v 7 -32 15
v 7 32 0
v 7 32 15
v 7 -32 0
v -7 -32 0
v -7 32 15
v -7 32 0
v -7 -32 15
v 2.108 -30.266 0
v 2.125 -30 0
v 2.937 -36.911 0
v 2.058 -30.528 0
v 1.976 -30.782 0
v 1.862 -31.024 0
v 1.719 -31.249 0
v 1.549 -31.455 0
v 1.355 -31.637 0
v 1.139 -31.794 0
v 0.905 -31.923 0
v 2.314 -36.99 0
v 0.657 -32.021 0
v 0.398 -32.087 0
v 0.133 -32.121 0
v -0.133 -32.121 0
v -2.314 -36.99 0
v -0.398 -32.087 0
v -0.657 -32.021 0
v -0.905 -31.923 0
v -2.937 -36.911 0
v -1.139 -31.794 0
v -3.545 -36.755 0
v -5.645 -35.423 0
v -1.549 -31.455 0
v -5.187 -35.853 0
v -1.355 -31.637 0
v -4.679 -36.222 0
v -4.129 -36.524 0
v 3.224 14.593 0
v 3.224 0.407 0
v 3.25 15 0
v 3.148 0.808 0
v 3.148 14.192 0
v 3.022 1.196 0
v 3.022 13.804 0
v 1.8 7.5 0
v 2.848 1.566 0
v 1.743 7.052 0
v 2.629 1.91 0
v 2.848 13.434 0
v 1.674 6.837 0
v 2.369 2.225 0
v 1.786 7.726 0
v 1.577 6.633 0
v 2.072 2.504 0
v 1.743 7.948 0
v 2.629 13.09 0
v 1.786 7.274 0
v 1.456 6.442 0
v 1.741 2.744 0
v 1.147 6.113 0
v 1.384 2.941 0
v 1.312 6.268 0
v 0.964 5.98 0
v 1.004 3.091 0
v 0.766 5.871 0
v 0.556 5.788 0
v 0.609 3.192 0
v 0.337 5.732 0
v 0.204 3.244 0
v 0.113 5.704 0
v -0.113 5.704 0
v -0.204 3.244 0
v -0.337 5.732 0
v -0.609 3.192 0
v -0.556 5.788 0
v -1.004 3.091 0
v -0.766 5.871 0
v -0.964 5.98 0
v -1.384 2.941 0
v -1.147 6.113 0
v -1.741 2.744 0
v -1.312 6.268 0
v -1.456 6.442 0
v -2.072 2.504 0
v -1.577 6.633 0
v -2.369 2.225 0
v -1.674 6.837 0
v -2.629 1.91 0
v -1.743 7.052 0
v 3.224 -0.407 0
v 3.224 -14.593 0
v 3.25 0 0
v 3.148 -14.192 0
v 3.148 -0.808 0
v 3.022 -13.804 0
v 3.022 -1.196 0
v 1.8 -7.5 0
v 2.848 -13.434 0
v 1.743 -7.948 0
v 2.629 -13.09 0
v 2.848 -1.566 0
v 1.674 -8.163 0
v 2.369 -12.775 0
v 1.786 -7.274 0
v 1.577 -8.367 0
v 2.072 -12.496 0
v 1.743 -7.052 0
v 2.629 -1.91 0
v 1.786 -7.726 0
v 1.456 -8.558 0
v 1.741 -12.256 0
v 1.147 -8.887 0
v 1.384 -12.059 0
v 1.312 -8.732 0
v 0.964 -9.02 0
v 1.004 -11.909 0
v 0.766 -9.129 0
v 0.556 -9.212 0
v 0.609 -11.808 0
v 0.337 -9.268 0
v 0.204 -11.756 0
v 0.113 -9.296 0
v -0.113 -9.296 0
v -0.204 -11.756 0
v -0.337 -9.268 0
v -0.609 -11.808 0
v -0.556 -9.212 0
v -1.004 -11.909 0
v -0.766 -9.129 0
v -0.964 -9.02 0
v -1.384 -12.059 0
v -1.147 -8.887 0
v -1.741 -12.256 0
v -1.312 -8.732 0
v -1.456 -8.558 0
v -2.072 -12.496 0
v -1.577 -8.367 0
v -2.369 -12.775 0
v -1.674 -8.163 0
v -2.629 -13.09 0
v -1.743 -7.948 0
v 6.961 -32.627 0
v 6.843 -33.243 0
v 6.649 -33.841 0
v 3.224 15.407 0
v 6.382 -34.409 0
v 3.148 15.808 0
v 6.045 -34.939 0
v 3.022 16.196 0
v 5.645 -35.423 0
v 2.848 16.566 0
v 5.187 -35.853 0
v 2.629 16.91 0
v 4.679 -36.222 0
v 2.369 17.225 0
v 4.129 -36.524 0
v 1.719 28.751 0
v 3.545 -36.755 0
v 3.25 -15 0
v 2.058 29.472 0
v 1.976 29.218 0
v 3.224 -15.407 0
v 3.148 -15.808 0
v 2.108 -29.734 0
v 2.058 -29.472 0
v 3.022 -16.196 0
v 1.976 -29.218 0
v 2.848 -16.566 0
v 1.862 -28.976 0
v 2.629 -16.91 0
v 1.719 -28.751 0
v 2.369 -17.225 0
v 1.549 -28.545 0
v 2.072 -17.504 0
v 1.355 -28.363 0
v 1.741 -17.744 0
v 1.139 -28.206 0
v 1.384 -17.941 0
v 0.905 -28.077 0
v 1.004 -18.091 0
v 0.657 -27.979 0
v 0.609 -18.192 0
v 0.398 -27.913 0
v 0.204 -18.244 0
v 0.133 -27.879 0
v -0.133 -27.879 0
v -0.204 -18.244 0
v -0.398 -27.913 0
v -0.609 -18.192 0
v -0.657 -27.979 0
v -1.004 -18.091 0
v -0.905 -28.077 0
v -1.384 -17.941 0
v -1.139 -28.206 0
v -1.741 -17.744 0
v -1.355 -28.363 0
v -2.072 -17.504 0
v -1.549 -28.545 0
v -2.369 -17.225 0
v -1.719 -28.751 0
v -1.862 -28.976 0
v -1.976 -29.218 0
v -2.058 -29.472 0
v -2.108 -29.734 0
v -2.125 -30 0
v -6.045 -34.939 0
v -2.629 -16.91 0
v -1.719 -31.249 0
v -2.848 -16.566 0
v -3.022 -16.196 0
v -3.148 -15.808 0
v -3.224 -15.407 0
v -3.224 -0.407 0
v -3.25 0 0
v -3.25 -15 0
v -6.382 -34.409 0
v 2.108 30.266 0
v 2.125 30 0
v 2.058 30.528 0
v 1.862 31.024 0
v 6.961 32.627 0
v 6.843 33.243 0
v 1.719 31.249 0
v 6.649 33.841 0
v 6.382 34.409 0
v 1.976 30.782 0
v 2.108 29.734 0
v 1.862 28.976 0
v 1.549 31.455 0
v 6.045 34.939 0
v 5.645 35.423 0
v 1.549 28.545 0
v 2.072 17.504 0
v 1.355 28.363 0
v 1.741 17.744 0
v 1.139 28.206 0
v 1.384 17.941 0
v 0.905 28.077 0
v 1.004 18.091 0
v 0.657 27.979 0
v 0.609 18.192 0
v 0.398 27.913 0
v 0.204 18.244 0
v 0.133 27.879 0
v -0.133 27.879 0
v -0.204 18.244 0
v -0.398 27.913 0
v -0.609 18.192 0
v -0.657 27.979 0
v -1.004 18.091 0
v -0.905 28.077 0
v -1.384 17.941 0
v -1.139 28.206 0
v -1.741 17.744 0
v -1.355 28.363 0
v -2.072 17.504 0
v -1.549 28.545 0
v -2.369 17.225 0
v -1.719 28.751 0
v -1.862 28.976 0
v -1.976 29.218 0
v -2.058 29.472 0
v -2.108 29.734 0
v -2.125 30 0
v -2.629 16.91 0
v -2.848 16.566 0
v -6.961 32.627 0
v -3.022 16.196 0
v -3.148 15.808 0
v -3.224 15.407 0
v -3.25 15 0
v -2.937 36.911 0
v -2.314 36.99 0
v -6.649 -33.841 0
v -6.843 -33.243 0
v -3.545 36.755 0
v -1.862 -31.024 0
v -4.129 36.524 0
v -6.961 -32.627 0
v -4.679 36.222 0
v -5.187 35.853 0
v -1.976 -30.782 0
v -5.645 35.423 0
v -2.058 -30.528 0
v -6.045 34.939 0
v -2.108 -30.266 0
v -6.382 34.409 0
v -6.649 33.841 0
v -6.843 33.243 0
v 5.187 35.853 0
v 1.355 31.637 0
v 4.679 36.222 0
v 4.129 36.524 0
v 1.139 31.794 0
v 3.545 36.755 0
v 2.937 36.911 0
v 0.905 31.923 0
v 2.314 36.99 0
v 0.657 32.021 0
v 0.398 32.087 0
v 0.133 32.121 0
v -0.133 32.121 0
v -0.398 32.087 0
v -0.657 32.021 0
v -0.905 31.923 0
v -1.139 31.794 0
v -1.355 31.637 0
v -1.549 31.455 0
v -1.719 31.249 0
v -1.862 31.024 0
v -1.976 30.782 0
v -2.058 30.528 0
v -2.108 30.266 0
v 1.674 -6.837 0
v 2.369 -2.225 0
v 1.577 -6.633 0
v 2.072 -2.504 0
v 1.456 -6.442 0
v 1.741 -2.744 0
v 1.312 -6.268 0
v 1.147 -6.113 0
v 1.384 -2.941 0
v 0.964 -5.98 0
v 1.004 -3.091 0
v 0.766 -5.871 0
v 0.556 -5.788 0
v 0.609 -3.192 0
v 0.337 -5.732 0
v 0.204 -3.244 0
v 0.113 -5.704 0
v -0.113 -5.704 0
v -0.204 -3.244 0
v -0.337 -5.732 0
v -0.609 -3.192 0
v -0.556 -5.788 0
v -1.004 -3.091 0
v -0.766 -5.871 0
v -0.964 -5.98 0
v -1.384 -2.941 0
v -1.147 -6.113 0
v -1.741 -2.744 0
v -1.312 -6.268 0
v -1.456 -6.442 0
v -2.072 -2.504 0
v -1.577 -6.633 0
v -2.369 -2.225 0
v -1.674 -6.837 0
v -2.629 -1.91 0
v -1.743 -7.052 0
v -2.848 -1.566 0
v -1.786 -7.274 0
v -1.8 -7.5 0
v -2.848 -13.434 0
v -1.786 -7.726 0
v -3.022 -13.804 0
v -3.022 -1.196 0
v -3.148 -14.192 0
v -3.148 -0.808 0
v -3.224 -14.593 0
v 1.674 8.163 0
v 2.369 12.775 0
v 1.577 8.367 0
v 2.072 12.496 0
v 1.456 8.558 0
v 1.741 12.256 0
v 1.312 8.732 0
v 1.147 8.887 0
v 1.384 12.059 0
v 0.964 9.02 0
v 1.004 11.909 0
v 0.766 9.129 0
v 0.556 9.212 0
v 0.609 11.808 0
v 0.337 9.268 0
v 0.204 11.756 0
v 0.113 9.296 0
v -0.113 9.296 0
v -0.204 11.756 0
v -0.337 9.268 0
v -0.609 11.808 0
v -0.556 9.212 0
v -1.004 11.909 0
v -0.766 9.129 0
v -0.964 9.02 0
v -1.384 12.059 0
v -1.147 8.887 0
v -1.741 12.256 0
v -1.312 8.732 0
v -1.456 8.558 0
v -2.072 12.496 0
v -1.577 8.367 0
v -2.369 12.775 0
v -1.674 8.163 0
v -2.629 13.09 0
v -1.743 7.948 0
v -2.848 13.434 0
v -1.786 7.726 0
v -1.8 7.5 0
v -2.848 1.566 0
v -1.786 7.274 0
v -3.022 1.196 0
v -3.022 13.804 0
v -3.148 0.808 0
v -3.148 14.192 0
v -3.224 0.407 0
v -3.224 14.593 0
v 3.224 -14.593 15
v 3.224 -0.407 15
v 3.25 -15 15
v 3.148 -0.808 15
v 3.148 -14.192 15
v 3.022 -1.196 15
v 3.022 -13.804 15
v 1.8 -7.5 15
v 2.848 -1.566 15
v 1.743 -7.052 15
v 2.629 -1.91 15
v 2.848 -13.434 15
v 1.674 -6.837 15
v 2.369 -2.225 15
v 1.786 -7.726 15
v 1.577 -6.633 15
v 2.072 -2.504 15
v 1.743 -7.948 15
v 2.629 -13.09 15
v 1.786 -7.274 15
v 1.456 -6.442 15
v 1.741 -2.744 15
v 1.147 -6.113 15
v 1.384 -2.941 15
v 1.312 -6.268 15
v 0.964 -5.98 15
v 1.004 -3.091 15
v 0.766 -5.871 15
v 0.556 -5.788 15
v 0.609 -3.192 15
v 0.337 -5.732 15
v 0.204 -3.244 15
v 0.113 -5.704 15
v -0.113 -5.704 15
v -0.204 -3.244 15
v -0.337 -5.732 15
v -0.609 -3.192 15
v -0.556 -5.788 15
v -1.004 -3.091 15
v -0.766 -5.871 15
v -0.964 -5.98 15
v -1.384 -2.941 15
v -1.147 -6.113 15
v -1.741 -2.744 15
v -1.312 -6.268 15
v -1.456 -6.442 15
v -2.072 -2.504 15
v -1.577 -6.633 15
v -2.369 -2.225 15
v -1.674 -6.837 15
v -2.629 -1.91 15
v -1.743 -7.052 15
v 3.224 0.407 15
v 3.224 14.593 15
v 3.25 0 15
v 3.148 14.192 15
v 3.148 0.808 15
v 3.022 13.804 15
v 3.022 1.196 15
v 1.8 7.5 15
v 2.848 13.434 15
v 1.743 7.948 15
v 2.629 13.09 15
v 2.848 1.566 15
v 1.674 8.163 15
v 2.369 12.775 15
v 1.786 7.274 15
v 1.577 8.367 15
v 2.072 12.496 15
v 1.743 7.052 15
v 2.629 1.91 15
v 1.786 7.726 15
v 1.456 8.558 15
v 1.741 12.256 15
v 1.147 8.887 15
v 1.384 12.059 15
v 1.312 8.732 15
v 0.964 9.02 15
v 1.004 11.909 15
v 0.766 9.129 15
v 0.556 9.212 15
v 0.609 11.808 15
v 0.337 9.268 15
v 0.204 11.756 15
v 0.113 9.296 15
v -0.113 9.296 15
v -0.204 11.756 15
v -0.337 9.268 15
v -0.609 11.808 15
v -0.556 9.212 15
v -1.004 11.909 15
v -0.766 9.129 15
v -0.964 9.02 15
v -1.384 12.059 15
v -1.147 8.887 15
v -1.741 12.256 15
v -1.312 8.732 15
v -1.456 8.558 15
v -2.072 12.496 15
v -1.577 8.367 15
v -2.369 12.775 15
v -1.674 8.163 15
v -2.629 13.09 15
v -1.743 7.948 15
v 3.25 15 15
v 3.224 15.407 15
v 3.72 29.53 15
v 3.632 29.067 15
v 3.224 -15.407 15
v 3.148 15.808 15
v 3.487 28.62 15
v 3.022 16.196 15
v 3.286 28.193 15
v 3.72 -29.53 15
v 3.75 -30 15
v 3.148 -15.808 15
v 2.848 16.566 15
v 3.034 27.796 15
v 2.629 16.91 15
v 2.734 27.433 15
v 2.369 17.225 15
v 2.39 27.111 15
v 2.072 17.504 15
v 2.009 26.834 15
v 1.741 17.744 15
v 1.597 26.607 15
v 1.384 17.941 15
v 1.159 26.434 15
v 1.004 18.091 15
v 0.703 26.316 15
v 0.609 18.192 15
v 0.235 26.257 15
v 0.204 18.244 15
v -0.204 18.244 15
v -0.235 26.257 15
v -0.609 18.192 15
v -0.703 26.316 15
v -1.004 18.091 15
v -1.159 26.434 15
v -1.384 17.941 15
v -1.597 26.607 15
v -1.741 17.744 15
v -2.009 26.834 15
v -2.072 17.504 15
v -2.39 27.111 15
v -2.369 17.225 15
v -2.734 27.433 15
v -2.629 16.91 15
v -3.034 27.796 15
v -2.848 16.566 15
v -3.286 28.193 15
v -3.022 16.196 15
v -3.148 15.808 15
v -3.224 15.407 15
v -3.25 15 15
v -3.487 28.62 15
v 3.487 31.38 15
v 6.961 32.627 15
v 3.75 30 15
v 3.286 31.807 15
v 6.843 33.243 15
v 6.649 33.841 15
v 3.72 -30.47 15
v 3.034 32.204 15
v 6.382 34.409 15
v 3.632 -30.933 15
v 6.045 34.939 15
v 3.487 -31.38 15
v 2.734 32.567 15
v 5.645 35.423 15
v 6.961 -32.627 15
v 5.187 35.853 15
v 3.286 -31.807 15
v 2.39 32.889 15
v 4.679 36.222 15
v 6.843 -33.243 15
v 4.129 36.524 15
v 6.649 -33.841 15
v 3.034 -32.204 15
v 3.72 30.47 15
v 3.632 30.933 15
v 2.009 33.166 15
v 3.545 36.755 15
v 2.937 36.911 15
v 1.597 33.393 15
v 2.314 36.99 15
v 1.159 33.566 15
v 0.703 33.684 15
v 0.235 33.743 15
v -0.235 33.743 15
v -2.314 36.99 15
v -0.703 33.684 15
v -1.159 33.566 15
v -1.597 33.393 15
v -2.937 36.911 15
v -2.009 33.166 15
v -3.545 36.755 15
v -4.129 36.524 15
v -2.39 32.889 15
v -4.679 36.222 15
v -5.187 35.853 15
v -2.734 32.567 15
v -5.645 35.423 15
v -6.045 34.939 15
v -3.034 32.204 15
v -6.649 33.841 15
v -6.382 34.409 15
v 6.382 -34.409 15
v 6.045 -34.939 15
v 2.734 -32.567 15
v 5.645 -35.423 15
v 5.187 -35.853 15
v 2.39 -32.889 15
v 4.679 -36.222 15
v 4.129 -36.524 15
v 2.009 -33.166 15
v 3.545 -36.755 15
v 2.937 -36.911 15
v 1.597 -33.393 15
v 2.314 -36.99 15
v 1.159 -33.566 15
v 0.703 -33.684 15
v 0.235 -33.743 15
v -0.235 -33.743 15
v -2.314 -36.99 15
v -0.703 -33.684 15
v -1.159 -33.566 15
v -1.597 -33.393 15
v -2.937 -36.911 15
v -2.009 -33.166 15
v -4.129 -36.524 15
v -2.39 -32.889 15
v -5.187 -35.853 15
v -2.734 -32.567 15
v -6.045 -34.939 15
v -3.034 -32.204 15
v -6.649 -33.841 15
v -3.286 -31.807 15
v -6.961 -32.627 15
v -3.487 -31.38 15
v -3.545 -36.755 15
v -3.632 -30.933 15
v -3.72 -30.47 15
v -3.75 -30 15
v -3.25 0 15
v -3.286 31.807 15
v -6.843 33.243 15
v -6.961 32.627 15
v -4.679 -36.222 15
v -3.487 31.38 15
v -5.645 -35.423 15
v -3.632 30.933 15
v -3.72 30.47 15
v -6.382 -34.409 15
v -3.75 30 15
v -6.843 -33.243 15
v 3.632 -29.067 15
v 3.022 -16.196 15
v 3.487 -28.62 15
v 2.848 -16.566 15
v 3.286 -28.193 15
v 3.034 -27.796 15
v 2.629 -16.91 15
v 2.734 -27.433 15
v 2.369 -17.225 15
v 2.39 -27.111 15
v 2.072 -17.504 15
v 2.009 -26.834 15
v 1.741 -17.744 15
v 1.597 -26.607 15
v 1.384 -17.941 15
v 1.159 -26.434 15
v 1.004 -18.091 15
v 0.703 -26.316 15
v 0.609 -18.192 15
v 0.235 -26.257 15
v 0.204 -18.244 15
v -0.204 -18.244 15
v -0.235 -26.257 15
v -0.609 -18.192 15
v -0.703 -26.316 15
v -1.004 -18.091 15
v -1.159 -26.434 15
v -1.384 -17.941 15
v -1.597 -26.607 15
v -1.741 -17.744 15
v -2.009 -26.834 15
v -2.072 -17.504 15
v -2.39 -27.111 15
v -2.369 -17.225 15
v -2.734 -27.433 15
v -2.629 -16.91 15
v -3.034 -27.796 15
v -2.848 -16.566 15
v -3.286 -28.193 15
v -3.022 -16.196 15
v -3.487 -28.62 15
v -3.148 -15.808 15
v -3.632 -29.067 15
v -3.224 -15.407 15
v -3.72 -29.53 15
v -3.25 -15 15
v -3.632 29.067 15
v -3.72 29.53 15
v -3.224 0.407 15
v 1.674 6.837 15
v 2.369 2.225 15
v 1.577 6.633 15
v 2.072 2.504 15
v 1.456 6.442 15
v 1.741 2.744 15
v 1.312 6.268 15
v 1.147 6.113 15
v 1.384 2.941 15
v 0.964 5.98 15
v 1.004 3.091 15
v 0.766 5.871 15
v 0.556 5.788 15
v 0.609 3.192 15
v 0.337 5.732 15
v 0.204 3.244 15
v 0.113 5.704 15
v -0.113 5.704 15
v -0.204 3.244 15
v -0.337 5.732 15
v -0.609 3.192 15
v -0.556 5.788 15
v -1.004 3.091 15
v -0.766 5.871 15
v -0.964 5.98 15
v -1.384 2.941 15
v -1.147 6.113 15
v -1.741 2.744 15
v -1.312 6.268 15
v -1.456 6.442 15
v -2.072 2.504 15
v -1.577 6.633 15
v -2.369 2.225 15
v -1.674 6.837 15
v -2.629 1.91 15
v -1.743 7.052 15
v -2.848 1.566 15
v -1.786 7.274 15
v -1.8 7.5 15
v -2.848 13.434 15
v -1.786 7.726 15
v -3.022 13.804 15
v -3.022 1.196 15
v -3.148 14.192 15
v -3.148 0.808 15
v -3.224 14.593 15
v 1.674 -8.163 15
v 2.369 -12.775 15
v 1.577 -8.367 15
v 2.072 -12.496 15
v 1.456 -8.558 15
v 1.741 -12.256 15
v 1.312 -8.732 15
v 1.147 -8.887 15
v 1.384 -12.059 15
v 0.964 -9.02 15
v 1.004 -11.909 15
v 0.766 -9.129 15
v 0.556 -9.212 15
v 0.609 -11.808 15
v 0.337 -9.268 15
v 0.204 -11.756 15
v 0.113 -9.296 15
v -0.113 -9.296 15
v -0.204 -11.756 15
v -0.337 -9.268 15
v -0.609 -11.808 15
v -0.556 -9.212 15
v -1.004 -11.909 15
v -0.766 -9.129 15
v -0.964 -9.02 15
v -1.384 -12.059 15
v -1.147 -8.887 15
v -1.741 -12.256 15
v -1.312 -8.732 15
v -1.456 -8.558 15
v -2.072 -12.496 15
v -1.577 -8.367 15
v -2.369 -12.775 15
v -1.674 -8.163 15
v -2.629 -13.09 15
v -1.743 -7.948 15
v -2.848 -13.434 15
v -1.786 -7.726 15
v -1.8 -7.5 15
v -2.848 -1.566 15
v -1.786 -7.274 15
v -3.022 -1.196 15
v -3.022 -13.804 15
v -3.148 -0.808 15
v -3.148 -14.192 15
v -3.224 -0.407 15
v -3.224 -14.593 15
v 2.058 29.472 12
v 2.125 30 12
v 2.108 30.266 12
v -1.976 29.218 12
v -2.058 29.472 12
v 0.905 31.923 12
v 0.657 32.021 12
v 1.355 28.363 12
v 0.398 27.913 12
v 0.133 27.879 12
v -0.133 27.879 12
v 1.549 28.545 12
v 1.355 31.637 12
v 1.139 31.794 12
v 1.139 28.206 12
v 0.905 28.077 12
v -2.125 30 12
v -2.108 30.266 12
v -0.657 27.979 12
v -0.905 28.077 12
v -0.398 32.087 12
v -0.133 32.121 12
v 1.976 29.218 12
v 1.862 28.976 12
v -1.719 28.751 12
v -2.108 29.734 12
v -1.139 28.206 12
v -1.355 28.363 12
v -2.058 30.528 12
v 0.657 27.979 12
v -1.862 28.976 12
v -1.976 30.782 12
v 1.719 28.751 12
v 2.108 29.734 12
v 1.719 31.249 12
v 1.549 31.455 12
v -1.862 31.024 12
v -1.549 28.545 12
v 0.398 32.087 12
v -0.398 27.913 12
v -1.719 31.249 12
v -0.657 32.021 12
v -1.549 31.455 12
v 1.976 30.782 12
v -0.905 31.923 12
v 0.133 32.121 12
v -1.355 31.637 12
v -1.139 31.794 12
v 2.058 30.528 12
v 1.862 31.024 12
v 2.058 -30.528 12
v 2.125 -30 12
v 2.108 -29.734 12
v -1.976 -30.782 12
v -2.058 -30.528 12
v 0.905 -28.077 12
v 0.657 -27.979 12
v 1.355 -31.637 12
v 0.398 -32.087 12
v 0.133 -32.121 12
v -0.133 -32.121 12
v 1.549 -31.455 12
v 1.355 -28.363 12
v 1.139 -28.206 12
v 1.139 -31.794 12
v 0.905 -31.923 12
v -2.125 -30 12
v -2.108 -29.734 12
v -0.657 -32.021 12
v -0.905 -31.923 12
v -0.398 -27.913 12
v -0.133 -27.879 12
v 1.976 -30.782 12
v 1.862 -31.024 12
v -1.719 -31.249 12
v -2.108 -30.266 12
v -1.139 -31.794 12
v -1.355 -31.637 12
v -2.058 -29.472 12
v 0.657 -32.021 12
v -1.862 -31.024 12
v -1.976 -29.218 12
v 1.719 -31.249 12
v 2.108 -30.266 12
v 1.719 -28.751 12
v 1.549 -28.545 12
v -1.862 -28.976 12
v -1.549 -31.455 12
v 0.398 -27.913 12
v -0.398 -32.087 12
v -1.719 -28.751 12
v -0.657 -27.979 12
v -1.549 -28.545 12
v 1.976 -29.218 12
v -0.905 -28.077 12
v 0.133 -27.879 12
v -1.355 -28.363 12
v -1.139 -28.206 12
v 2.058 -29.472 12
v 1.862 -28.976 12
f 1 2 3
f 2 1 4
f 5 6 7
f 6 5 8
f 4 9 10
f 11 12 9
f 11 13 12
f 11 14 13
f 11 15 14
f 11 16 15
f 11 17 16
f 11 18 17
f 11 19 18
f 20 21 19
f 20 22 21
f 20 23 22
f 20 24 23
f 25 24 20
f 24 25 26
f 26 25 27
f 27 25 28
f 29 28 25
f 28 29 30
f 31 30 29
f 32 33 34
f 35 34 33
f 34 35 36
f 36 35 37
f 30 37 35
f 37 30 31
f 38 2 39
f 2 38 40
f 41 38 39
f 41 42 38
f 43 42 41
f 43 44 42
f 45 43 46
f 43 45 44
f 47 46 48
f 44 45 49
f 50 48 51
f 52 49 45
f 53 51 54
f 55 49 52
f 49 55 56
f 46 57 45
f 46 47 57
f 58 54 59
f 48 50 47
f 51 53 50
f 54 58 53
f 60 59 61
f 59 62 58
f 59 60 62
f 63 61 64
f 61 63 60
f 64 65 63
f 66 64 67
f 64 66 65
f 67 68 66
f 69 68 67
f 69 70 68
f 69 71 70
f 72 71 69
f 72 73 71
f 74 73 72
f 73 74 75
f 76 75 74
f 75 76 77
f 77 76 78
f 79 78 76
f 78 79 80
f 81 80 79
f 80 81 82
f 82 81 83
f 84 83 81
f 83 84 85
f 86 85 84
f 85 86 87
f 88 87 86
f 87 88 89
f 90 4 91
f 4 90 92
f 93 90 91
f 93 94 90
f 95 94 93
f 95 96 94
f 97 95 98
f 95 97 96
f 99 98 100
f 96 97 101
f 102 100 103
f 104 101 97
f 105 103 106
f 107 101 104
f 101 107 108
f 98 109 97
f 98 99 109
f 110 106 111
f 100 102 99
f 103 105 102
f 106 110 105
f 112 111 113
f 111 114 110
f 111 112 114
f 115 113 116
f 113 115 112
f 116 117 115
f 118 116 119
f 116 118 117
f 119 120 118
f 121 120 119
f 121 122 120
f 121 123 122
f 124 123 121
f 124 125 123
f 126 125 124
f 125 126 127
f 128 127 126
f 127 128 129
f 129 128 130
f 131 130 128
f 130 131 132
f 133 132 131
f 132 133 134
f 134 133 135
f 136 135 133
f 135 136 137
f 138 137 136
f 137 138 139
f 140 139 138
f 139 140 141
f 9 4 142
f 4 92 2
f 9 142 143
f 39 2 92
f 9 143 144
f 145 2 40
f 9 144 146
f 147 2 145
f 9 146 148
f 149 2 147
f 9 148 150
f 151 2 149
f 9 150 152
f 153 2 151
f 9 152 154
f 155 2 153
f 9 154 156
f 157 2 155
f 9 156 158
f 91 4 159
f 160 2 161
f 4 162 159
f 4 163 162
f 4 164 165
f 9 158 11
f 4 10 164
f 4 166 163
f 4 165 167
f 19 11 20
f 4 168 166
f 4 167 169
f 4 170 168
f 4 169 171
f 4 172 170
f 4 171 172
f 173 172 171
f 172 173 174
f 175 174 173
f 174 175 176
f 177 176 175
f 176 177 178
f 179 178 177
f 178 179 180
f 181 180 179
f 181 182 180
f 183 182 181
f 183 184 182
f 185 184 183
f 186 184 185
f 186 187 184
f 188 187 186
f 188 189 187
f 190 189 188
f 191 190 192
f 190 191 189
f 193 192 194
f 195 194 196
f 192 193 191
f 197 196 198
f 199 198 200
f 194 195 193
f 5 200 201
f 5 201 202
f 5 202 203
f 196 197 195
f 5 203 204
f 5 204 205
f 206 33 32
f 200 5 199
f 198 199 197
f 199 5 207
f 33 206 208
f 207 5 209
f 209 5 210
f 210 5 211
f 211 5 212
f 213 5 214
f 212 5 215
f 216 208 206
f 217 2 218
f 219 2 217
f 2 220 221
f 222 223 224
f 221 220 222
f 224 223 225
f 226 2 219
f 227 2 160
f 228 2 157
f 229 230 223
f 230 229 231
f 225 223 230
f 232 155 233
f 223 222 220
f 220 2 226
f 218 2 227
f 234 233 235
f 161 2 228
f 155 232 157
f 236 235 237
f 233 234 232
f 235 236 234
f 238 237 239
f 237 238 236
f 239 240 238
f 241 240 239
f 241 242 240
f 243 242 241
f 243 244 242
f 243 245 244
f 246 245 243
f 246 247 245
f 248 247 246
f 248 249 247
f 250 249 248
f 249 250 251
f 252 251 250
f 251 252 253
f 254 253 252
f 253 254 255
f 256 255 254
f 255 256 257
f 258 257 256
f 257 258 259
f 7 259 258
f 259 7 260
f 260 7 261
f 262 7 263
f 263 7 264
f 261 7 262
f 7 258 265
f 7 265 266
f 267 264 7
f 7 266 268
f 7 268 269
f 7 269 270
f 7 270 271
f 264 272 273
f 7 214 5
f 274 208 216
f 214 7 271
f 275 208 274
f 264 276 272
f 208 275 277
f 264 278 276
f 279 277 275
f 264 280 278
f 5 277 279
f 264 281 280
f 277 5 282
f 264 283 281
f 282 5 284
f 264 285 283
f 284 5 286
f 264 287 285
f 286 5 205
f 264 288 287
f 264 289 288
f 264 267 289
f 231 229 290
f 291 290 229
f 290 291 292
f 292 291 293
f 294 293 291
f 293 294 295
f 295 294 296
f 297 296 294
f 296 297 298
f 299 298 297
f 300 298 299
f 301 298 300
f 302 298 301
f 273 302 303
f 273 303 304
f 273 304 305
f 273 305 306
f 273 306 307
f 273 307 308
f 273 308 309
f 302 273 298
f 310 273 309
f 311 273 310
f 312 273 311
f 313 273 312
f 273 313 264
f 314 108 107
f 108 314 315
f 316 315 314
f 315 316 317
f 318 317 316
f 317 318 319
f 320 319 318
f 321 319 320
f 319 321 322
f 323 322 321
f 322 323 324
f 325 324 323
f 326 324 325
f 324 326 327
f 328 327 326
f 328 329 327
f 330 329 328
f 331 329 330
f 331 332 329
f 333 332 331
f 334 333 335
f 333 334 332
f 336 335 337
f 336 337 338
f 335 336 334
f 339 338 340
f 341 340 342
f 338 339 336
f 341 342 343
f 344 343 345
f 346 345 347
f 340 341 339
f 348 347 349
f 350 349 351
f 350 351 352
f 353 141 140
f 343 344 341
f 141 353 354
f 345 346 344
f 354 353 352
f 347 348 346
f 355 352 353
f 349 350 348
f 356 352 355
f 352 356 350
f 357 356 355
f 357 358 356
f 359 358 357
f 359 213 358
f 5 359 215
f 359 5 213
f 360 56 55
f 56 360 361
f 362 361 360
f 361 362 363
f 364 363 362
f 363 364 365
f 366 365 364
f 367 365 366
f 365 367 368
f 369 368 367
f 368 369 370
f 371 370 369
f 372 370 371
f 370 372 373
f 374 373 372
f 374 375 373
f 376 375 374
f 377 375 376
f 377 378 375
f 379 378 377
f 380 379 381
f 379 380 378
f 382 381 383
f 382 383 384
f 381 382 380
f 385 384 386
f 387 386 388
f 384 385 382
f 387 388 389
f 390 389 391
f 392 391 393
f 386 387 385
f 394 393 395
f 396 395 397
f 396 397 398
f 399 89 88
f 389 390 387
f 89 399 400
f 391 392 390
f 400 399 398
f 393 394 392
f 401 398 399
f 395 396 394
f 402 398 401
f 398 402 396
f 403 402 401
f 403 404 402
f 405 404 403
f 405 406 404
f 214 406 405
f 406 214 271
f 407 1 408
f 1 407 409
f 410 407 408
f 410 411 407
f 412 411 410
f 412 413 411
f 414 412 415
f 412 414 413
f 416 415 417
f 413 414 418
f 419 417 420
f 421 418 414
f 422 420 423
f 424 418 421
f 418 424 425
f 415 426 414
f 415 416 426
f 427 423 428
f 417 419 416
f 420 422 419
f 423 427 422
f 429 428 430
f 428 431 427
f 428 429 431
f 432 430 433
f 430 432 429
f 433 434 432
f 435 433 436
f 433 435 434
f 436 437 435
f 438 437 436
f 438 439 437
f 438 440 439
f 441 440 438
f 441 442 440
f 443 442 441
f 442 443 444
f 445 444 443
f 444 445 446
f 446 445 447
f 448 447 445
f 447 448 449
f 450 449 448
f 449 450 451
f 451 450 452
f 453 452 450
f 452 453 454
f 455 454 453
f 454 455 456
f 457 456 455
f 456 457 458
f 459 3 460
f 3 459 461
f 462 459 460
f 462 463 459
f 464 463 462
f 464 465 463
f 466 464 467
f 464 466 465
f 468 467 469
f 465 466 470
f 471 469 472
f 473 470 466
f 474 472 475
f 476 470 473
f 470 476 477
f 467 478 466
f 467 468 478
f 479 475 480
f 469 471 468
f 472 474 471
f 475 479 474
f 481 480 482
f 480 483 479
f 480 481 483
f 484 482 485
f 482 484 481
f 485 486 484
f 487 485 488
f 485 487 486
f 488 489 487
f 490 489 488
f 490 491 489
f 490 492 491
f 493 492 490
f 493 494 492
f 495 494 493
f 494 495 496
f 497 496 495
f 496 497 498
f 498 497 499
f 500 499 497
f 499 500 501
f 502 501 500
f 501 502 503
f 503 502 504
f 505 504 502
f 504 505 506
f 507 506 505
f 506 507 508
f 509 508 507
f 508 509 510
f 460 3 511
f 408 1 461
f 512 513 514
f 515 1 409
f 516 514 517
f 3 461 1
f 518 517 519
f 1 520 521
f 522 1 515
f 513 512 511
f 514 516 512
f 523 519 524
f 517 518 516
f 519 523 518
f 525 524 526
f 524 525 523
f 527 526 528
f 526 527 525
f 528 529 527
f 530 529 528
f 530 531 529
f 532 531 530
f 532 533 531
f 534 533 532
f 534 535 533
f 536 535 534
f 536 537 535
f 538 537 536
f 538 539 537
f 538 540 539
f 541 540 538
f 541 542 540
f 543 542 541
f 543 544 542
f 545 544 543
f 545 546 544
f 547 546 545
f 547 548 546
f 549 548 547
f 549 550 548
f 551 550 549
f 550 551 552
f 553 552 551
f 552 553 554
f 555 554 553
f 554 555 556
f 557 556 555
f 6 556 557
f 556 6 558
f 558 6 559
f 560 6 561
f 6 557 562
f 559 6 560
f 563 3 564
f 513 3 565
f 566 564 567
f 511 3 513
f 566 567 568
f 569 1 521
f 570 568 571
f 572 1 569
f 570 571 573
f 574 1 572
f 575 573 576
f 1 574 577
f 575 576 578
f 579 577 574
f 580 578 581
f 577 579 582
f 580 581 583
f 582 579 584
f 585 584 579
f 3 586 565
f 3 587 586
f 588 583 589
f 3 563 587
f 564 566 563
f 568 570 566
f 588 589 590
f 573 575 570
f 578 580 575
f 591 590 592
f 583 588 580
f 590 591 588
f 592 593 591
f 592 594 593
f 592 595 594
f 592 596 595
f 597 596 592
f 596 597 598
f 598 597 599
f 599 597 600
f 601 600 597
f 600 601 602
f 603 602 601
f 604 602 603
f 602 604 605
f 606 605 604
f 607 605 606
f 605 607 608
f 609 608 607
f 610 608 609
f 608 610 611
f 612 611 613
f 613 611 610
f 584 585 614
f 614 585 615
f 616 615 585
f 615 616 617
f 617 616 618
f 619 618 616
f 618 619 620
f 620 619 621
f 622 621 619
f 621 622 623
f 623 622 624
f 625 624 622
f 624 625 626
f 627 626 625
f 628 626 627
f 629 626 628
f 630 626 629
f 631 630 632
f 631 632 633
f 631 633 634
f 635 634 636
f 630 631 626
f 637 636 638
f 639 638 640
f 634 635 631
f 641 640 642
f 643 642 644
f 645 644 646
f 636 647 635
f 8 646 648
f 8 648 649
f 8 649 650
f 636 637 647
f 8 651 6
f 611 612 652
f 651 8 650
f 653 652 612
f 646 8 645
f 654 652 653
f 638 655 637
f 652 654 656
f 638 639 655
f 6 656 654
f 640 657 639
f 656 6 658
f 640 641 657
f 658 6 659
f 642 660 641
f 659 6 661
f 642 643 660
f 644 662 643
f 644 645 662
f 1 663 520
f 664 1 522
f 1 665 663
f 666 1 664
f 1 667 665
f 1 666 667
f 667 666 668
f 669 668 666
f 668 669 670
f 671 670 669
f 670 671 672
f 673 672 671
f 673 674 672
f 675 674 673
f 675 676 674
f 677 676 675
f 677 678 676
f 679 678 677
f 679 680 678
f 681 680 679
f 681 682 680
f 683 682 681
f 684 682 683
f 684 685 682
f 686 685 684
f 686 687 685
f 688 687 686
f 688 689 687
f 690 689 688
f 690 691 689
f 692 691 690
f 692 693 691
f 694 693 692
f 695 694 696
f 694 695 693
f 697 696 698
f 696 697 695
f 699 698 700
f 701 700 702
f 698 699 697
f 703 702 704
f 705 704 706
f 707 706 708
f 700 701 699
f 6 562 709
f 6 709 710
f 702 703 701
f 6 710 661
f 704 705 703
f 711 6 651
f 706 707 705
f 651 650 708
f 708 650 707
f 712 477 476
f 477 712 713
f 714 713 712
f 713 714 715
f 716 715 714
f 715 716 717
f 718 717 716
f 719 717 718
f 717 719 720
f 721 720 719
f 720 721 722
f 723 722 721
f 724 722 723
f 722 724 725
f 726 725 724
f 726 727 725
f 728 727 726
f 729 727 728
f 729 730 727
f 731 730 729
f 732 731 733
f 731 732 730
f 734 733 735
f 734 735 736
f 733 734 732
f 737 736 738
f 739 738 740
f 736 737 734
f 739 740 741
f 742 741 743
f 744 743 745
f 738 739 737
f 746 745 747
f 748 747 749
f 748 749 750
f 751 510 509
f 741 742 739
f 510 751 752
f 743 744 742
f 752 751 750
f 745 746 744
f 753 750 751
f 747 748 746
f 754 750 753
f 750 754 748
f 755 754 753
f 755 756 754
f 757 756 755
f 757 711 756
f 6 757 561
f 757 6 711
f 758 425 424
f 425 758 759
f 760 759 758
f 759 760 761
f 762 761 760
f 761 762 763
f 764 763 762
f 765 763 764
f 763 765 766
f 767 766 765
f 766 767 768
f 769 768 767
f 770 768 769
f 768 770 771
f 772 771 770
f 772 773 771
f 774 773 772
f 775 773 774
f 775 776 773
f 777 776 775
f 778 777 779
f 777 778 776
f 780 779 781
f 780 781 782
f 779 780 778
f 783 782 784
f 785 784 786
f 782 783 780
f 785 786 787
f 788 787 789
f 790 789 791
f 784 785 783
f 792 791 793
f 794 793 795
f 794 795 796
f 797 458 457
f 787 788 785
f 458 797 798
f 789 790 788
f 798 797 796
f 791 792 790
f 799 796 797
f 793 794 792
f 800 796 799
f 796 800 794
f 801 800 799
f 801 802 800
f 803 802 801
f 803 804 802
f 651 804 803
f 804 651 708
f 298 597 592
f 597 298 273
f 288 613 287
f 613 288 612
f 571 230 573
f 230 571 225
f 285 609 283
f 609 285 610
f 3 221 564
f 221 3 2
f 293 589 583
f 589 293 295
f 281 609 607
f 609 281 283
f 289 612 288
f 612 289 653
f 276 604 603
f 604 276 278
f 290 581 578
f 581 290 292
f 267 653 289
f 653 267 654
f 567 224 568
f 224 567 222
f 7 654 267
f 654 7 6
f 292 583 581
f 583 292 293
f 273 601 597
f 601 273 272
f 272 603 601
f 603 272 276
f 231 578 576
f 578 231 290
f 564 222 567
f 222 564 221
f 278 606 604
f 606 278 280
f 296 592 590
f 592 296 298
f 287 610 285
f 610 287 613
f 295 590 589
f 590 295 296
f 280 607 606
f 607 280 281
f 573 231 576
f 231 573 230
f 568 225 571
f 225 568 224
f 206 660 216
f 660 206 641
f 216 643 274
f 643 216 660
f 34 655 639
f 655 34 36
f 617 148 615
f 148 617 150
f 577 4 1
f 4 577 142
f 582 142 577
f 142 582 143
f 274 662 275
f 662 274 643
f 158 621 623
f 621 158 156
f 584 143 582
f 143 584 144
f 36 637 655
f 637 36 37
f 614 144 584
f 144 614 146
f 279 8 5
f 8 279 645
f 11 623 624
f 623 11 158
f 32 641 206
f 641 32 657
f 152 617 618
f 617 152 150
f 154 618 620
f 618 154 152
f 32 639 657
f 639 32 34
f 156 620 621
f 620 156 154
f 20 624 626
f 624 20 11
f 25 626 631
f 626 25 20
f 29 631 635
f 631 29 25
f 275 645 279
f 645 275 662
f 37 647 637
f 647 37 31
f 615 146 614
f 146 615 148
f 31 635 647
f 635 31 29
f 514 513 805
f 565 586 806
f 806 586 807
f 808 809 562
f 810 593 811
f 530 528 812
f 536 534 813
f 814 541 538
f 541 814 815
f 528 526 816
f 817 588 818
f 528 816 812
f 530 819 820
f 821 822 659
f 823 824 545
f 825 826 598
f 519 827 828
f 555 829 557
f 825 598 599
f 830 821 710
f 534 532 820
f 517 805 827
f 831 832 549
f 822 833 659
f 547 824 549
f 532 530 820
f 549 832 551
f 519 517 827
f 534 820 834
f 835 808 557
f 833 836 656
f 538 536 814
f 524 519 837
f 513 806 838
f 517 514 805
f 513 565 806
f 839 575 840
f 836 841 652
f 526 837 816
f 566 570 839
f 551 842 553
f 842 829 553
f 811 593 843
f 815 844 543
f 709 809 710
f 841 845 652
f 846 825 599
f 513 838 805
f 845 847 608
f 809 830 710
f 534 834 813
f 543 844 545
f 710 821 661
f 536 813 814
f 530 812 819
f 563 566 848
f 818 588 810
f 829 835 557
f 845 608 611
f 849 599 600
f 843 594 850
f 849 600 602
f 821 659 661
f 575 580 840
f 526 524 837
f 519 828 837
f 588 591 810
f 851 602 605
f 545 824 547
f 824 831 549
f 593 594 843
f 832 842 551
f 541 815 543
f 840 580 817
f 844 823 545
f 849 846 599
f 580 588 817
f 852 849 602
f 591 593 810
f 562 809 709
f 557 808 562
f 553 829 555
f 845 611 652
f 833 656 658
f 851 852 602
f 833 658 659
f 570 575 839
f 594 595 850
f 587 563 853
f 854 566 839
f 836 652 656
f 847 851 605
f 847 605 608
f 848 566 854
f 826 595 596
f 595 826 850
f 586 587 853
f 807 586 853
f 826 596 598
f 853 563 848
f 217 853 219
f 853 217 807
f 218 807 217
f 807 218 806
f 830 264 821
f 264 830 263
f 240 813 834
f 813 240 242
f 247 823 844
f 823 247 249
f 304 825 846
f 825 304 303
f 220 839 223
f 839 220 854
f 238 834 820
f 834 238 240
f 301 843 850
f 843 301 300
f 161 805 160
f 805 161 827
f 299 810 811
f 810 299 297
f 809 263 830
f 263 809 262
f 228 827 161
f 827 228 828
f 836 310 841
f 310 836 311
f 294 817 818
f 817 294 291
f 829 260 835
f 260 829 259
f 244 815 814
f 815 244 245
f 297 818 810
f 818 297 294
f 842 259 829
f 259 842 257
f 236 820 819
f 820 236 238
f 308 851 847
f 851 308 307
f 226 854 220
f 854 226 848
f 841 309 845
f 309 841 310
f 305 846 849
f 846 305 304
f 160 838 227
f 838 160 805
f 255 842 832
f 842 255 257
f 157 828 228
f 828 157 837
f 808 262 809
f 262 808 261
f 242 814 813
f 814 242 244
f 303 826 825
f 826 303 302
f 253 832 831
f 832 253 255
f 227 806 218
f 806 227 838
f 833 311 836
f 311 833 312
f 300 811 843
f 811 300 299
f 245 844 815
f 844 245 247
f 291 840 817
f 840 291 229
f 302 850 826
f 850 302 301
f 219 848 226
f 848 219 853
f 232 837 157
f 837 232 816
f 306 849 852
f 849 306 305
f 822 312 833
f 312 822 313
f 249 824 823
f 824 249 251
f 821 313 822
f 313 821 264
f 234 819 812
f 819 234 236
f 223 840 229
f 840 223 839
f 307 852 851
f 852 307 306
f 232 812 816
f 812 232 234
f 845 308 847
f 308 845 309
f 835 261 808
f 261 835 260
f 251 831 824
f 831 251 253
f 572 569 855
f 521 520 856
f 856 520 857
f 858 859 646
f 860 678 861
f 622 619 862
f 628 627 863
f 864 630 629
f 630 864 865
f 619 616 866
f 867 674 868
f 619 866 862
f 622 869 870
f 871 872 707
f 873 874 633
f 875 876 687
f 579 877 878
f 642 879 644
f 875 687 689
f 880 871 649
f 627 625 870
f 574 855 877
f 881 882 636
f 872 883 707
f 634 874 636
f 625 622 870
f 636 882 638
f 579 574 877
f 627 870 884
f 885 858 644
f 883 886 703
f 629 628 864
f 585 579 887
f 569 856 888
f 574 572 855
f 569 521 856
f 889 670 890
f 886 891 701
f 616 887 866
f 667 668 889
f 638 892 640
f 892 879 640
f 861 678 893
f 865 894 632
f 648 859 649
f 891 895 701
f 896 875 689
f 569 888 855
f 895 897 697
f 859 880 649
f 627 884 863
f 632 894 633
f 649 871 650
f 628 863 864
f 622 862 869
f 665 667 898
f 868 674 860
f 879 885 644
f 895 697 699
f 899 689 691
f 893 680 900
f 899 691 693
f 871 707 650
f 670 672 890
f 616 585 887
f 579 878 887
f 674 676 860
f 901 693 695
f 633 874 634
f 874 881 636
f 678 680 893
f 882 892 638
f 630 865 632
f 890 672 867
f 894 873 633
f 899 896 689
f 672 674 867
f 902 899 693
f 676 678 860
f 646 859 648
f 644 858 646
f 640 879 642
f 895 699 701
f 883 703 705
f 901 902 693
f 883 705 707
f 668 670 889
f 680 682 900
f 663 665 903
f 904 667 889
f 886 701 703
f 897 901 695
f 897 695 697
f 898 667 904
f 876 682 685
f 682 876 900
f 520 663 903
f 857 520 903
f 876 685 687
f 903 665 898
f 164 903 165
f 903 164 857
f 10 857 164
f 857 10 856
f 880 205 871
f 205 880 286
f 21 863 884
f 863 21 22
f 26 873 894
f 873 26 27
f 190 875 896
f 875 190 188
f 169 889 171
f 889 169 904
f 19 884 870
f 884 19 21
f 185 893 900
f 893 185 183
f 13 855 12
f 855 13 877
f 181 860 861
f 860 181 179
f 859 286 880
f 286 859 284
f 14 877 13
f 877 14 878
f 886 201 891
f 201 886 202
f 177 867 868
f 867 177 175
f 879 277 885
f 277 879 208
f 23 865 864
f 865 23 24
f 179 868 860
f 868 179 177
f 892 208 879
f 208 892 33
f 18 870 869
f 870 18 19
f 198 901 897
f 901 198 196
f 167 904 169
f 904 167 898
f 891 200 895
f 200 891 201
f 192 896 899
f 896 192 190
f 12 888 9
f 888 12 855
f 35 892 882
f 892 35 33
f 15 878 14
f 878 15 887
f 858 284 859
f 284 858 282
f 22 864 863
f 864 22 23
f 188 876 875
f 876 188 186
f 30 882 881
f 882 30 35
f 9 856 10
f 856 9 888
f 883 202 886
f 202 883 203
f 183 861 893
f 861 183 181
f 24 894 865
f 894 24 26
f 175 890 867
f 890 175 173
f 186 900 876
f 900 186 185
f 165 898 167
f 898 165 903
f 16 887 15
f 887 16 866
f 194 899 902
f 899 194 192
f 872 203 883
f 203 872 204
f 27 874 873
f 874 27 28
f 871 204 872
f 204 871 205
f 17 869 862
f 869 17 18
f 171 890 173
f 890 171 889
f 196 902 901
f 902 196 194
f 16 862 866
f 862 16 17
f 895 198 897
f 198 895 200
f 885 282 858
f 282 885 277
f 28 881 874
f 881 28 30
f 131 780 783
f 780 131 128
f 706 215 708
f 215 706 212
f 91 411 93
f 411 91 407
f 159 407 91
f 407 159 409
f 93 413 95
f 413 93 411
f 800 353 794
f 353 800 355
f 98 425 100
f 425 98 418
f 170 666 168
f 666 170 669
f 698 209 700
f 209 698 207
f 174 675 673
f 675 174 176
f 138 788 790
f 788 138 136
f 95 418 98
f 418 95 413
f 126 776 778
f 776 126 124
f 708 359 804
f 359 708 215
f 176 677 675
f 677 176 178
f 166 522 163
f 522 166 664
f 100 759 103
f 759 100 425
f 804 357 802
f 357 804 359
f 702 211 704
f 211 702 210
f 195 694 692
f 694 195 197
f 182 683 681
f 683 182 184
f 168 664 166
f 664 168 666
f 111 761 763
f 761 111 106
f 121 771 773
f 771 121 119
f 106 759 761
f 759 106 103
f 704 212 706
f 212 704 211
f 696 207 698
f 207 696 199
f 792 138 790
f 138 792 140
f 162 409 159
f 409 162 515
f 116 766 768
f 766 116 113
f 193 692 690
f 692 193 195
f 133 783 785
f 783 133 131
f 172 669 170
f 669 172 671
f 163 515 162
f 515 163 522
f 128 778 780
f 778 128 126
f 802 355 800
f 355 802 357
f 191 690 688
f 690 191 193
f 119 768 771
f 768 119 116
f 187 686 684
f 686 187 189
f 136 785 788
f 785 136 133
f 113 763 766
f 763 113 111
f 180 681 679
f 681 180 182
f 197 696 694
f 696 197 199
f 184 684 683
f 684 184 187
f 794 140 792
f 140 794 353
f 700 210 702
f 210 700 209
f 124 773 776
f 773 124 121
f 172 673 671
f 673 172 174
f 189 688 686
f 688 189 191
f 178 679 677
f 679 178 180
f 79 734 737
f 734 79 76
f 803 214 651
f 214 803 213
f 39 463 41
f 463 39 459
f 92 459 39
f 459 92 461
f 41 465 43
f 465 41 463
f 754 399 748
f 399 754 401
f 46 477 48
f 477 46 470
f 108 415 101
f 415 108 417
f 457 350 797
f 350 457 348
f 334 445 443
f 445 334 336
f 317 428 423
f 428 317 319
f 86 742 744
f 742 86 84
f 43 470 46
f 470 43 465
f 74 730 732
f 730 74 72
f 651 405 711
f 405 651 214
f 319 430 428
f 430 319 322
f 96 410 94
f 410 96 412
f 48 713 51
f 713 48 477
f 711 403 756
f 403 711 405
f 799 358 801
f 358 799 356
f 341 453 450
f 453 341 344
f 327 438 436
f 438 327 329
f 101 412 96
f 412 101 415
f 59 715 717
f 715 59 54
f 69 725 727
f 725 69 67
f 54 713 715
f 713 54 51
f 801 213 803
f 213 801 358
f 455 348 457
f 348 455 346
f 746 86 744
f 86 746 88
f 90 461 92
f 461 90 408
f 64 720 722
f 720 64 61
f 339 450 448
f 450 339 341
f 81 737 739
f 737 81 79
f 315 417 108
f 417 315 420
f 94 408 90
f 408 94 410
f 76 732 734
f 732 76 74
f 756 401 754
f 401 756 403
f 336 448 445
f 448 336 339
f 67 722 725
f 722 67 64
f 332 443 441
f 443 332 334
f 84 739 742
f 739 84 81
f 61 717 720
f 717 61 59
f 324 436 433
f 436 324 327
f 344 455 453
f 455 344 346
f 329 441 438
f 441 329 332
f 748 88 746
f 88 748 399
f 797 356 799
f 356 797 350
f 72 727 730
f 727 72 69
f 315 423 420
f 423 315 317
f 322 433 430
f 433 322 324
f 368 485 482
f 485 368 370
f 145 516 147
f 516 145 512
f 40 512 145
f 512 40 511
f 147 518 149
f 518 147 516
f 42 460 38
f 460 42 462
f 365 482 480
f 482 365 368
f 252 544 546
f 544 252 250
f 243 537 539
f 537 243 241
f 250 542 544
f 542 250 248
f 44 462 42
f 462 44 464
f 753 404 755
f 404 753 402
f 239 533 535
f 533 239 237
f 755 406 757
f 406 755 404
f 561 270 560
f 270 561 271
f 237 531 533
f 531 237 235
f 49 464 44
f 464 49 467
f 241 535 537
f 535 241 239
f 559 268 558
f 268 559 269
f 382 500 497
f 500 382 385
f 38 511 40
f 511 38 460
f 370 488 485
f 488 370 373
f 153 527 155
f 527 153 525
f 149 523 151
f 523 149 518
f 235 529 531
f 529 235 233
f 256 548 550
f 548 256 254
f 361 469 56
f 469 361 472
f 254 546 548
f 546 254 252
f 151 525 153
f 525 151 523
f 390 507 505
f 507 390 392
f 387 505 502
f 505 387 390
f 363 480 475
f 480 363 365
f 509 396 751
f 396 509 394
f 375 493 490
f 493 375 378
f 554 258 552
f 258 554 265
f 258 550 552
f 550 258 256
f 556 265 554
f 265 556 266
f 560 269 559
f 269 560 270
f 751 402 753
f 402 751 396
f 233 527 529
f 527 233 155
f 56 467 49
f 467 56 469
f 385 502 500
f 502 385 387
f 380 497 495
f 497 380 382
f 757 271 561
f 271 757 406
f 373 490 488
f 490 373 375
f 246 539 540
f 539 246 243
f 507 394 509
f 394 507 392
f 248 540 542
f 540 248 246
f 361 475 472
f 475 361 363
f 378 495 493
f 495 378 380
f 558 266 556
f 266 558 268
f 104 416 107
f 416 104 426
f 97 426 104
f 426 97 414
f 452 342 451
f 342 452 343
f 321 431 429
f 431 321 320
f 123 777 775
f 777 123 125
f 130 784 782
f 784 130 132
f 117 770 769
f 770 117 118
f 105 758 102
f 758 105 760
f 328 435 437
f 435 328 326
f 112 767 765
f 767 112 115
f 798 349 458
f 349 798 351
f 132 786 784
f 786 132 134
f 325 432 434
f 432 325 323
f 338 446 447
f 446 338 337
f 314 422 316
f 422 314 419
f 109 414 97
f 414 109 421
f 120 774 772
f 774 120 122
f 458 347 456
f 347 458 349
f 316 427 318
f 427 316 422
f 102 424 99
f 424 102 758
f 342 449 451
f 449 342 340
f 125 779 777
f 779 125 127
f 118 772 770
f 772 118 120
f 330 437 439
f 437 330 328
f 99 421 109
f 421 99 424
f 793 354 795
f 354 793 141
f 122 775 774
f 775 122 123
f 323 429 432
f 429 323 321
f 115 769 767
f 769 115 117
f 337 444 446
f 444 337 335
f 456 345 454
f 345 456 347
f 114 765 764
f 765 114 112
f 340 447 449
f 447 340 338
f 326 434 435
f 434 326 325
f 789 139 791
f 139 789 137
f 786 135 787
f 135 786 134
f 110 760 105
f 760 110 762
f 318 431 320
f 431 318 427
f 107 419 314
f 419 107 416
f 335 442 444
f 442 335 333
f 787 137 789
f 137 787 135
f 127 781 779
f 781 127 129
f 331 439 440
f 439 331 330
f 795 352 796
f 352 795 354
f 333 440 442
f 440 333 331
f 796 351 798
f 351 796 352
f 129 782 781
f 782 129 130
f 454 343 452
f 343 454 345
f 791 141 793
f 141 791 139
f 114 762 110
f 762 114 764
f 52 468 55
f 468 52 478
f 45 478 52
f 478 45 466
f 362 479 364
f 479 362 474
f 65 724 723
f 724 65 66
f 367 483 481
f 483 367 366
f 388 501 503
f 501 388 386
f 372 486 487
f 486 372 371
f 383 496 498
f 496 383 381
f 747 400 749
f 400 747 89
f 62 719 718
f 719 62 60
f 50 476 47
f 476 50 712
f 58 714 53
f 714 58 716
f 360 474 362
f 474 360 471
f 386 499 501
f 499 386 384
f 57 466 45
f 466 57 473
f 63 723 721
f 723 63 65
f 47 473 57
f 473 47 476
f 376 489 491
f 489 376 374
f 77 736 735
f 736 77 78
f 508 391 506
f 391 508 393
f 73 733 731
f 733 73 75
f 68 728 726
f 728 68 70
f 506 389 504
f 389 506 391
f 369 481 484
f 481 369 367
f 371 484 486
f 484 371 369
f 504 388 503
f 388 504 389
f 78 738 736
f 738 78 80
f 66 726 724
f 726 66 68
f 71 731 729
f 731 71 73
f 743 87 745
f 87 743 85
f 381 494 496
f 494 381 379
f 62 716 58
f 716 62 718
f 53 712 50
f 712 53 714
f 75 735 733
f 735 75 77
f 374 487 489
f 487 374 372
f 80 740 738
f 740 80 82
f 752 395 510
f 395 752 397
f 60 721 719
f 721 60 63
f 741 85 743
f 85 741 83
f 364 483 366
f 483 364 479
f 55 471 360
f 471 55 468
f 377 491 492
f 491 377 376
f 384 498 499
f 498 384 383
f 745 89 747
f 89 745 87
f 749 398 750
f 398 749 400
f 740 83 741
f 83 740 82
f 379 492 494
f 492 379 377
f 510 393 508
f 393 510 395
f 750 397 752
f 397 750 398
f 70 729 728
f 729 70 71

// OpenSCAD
$fn = 50;


difference() {
	union() {
		hull() {
			translate(v = [-2.0000000000, 17.0000000000, 0]) {
				cylinder(h = 15, r = 5);
			}
			translate(v = [2.0000000000, 17.0000000000, 0]) {
				cylinder(h = 15, r = 5);
			}
			translate(v = [-2.0000000000, -17.0000000000, 0]) {
				cylinder(h = 15, r = 5);
			}
			translate(v = [2.0000000000, -17.0000000000, 0]) {
				cylinder(h = 15, r = 5);
			}
		}
		translate(v = [0.0000000000, 22.5000000000, 0]) {
			hull() {
				translate(v = [-2.0000000000, 9.5000000000, 0]) {
					cylinder(h = 15, r = 5);
				}
				translate(v = [2.0000000000, 9.5000000000, 0]) {
					cylinder(h = 15, r = 5);
				}
				translate(v = [-2.0000000000, -9.5000000000, 0]) {
					cylinder(h = 15, r = 5);
				}
				translate(v = [2.0000000000, -9.5000000000, 0]) {
					cylinder(h = 15, r = 5);
				}
			}
		}
		translate(v = [0.0000000000, 22.5000000000, 0]) {
			hull() {
				translate(v = [-2.0000000000, 9.5000000000, 0]) {
					cylinder(h = 15, r = 5);
				}
				translate(v = [2.0000000000, 9.5000000000, 0]) {
					cylinder(h = 15, r = 5);
				}
				translate(v = [-2.0000000000, -9.5000000000, 0]) {
					cylinder(h = 15, r = 5);
				}
				translate(v = [2.0000000000, -9.5000000000, 0]) {
					cylinder(h = 15, r = 5);
				}
			}
		}
		translate(v = [0.0000000000, -22.5000000000, 0]) {
			hull() {
				translate(v = [-2.0000000000, 9.5000000000, 0]) {
					cylinder(h = 15, r = 5);
				}
				translate(v = [2.0000000000, 9.5000000000, 0]) {
					cylinder(h = 15, r = 5);
				}
				translate(v = [-2.0000000000, -9.5000000000, 0]) {
					cylinder(h = 15, r = 5);
				}
				translate(v = [2.0000000000, -9.5000000000, 0]) {
					cylinder(h = 15, r = 5);
				}
			}
		}
		translate(v = [0.0000000000, -22.5000000000, 0]) {
			hull() {
				translate(v = [-2.0000000000, 9.5000000000, 0]) {
					cylinder(h = 15, r = 5);
				}
				translate(v = [2.0000000000, 9.5000000000, 0]) {
					cylinder(h = 15, r = 5);
				}
				translate(v = [-2.0000000000, -9.5000000000, 0]) {
					cylinder(h = 15, r = 5);
				}
				translate(v = [2.0000000000, -9.5000000000, 0]) {
					cylinder(h = 15, r = 5);
				}
			}
		}
	}
	union() {
		translate(v = [0.0000000000, 30.0000000000, 15]) {
			rotate(a = [0, 0, 0]) {
				difference() {
					union() {
						#translate(v = [0, 0, -15.0000000000]) {
							cylinder(h = 15, r = 2.0000000000);
						}
						#translate(v = [0, 0, -3]) {
							cylinder(h = 3, r1 = 2.1250000000, r2 = 3.7500000000);
						}
						#translate(v = [0, 0, -15.0000000000]) {
							cylinder(h = 15, r = 2.1250000000);
						}
						#translate(v = [0, 0, -15.0000000000]) {
							cylinder(h = 15, r = 2.0000000000);
						}
					}
					union();
				}
			}
		}
		translate(v = [0.0000000000, 30.0000000000, 15]) {
			rotate(a = [0, 0, 0]) {
				difference() {
					union() {
						#translate(v = [0, 0, -15.0000000000]) {
							cylinder(h = 15, r = 2.0000000000);
						}
						#translate(v = [0, 0, -3]) {
							cylinder(h = 3, r1 = 2.1250000000, r2 = 3.7500000000);
						}
						#translate(v = [0, 0, -15.0000000000]) {
							cylinder(h = 15, r = 2.1250000000);
						}
						#translate(v = [0, 0, -15.0000000000]) {
							cylinder(h = 15, r = 2.0000000000);
						}
					}
					union();
				}
			}
		}
		translate(v = [0.0000000000, -30.0000000000, 15]) {
			rotate(a = [0, 0, 0]) {
				difference() {
					union() {
						#translate(v = [0, 0, -15.0000000000]) {
							cylinder(h = 15, r = 2.0000000000);
						}
						#translate(v = [0, 0, -3]) {
							cylinder(h = 3, r1 = 2.1250000000, r2 = 3.7500000000);
						}
						#translate(v = [0, 0, -15.0000000000]) {
							cylinder(h = 15, r = 2.1250000000);
						}
						#translate(v = [0, 0, -15.0000000000]) {
							cylinder(h = 15, r = 2.0000000000);
						}
					}
					union();
				}
			}
		}
		translate(v = [0.0000000000, -30.0000000000, 15]) {
			rotate(a = [0, 0, 0]) {
				difference() {
					union() {
						#translate(v = [0, 0, -15.0000000000]) {
							cylinder(h = 15, r = 2.0000000000);
						}
						#translate(v = [0, 0, -3]) {
							cylinder(h = 3, r1 = 2.1250000000, r2 = 3.7500000000);
						}
						#translate(v = [0, 0, -15.0000000000]) {
							cylinder(h = 15, r = 2.1250000000);
						}
						#translate(v = [0, 0, -15.0000000000]) {
							cylinder(h = 15, r = 2.0000000000);
						}
					}
					union();
				}
			}
		}
		translate(v = [0.0000000000, -15.0000000000, 0]) {
			translate(v = [0, 0, -100]) {
				cylinder(h = 200, r = 3.2500000000);
			}
		}
		translate(v = [0, 0, -100]) {
			cylinder(h = 200, r = 3.2500000000);
		}
		translate(v = [0.0000000000, 15.0000000000, 0]) {
			translate(v = [0, 0, -100]) {
				cylinder(h = 200, r = 3.2500000000);
			}
		}
		translate(v = [0.0000000000, -15.0000000000, 0]) {
			translate(v = [0, 0, -100]) {
				cylinder(h = 200, r = 1.8000000000);
			}
		}
		translate(v = [0.0000000000, -7.5000000000, 0]) {
			translate(v = [0, 0, -100]) {
				cylinder(h = 200, r = 1.8000000000);
			}
		}
		translate(v = [0, 0, -100]) {
			cylinder(h = 200, r = 1.8000000000);
		}
		translate(v = [0.0000000000, 7.5000000000, 0]) {
			translate(v = [0, 0, -100]) {
				cylinder(h = 200, r = 1.8000000000);
			}
		}
		translate(v = [0.0000000000, 15.0000000000, 0]) {
			translate(v = [0, 0, -100]) {
				cylinder(h = 200, r = 1.8000000000);
			}
		}
	}
}
